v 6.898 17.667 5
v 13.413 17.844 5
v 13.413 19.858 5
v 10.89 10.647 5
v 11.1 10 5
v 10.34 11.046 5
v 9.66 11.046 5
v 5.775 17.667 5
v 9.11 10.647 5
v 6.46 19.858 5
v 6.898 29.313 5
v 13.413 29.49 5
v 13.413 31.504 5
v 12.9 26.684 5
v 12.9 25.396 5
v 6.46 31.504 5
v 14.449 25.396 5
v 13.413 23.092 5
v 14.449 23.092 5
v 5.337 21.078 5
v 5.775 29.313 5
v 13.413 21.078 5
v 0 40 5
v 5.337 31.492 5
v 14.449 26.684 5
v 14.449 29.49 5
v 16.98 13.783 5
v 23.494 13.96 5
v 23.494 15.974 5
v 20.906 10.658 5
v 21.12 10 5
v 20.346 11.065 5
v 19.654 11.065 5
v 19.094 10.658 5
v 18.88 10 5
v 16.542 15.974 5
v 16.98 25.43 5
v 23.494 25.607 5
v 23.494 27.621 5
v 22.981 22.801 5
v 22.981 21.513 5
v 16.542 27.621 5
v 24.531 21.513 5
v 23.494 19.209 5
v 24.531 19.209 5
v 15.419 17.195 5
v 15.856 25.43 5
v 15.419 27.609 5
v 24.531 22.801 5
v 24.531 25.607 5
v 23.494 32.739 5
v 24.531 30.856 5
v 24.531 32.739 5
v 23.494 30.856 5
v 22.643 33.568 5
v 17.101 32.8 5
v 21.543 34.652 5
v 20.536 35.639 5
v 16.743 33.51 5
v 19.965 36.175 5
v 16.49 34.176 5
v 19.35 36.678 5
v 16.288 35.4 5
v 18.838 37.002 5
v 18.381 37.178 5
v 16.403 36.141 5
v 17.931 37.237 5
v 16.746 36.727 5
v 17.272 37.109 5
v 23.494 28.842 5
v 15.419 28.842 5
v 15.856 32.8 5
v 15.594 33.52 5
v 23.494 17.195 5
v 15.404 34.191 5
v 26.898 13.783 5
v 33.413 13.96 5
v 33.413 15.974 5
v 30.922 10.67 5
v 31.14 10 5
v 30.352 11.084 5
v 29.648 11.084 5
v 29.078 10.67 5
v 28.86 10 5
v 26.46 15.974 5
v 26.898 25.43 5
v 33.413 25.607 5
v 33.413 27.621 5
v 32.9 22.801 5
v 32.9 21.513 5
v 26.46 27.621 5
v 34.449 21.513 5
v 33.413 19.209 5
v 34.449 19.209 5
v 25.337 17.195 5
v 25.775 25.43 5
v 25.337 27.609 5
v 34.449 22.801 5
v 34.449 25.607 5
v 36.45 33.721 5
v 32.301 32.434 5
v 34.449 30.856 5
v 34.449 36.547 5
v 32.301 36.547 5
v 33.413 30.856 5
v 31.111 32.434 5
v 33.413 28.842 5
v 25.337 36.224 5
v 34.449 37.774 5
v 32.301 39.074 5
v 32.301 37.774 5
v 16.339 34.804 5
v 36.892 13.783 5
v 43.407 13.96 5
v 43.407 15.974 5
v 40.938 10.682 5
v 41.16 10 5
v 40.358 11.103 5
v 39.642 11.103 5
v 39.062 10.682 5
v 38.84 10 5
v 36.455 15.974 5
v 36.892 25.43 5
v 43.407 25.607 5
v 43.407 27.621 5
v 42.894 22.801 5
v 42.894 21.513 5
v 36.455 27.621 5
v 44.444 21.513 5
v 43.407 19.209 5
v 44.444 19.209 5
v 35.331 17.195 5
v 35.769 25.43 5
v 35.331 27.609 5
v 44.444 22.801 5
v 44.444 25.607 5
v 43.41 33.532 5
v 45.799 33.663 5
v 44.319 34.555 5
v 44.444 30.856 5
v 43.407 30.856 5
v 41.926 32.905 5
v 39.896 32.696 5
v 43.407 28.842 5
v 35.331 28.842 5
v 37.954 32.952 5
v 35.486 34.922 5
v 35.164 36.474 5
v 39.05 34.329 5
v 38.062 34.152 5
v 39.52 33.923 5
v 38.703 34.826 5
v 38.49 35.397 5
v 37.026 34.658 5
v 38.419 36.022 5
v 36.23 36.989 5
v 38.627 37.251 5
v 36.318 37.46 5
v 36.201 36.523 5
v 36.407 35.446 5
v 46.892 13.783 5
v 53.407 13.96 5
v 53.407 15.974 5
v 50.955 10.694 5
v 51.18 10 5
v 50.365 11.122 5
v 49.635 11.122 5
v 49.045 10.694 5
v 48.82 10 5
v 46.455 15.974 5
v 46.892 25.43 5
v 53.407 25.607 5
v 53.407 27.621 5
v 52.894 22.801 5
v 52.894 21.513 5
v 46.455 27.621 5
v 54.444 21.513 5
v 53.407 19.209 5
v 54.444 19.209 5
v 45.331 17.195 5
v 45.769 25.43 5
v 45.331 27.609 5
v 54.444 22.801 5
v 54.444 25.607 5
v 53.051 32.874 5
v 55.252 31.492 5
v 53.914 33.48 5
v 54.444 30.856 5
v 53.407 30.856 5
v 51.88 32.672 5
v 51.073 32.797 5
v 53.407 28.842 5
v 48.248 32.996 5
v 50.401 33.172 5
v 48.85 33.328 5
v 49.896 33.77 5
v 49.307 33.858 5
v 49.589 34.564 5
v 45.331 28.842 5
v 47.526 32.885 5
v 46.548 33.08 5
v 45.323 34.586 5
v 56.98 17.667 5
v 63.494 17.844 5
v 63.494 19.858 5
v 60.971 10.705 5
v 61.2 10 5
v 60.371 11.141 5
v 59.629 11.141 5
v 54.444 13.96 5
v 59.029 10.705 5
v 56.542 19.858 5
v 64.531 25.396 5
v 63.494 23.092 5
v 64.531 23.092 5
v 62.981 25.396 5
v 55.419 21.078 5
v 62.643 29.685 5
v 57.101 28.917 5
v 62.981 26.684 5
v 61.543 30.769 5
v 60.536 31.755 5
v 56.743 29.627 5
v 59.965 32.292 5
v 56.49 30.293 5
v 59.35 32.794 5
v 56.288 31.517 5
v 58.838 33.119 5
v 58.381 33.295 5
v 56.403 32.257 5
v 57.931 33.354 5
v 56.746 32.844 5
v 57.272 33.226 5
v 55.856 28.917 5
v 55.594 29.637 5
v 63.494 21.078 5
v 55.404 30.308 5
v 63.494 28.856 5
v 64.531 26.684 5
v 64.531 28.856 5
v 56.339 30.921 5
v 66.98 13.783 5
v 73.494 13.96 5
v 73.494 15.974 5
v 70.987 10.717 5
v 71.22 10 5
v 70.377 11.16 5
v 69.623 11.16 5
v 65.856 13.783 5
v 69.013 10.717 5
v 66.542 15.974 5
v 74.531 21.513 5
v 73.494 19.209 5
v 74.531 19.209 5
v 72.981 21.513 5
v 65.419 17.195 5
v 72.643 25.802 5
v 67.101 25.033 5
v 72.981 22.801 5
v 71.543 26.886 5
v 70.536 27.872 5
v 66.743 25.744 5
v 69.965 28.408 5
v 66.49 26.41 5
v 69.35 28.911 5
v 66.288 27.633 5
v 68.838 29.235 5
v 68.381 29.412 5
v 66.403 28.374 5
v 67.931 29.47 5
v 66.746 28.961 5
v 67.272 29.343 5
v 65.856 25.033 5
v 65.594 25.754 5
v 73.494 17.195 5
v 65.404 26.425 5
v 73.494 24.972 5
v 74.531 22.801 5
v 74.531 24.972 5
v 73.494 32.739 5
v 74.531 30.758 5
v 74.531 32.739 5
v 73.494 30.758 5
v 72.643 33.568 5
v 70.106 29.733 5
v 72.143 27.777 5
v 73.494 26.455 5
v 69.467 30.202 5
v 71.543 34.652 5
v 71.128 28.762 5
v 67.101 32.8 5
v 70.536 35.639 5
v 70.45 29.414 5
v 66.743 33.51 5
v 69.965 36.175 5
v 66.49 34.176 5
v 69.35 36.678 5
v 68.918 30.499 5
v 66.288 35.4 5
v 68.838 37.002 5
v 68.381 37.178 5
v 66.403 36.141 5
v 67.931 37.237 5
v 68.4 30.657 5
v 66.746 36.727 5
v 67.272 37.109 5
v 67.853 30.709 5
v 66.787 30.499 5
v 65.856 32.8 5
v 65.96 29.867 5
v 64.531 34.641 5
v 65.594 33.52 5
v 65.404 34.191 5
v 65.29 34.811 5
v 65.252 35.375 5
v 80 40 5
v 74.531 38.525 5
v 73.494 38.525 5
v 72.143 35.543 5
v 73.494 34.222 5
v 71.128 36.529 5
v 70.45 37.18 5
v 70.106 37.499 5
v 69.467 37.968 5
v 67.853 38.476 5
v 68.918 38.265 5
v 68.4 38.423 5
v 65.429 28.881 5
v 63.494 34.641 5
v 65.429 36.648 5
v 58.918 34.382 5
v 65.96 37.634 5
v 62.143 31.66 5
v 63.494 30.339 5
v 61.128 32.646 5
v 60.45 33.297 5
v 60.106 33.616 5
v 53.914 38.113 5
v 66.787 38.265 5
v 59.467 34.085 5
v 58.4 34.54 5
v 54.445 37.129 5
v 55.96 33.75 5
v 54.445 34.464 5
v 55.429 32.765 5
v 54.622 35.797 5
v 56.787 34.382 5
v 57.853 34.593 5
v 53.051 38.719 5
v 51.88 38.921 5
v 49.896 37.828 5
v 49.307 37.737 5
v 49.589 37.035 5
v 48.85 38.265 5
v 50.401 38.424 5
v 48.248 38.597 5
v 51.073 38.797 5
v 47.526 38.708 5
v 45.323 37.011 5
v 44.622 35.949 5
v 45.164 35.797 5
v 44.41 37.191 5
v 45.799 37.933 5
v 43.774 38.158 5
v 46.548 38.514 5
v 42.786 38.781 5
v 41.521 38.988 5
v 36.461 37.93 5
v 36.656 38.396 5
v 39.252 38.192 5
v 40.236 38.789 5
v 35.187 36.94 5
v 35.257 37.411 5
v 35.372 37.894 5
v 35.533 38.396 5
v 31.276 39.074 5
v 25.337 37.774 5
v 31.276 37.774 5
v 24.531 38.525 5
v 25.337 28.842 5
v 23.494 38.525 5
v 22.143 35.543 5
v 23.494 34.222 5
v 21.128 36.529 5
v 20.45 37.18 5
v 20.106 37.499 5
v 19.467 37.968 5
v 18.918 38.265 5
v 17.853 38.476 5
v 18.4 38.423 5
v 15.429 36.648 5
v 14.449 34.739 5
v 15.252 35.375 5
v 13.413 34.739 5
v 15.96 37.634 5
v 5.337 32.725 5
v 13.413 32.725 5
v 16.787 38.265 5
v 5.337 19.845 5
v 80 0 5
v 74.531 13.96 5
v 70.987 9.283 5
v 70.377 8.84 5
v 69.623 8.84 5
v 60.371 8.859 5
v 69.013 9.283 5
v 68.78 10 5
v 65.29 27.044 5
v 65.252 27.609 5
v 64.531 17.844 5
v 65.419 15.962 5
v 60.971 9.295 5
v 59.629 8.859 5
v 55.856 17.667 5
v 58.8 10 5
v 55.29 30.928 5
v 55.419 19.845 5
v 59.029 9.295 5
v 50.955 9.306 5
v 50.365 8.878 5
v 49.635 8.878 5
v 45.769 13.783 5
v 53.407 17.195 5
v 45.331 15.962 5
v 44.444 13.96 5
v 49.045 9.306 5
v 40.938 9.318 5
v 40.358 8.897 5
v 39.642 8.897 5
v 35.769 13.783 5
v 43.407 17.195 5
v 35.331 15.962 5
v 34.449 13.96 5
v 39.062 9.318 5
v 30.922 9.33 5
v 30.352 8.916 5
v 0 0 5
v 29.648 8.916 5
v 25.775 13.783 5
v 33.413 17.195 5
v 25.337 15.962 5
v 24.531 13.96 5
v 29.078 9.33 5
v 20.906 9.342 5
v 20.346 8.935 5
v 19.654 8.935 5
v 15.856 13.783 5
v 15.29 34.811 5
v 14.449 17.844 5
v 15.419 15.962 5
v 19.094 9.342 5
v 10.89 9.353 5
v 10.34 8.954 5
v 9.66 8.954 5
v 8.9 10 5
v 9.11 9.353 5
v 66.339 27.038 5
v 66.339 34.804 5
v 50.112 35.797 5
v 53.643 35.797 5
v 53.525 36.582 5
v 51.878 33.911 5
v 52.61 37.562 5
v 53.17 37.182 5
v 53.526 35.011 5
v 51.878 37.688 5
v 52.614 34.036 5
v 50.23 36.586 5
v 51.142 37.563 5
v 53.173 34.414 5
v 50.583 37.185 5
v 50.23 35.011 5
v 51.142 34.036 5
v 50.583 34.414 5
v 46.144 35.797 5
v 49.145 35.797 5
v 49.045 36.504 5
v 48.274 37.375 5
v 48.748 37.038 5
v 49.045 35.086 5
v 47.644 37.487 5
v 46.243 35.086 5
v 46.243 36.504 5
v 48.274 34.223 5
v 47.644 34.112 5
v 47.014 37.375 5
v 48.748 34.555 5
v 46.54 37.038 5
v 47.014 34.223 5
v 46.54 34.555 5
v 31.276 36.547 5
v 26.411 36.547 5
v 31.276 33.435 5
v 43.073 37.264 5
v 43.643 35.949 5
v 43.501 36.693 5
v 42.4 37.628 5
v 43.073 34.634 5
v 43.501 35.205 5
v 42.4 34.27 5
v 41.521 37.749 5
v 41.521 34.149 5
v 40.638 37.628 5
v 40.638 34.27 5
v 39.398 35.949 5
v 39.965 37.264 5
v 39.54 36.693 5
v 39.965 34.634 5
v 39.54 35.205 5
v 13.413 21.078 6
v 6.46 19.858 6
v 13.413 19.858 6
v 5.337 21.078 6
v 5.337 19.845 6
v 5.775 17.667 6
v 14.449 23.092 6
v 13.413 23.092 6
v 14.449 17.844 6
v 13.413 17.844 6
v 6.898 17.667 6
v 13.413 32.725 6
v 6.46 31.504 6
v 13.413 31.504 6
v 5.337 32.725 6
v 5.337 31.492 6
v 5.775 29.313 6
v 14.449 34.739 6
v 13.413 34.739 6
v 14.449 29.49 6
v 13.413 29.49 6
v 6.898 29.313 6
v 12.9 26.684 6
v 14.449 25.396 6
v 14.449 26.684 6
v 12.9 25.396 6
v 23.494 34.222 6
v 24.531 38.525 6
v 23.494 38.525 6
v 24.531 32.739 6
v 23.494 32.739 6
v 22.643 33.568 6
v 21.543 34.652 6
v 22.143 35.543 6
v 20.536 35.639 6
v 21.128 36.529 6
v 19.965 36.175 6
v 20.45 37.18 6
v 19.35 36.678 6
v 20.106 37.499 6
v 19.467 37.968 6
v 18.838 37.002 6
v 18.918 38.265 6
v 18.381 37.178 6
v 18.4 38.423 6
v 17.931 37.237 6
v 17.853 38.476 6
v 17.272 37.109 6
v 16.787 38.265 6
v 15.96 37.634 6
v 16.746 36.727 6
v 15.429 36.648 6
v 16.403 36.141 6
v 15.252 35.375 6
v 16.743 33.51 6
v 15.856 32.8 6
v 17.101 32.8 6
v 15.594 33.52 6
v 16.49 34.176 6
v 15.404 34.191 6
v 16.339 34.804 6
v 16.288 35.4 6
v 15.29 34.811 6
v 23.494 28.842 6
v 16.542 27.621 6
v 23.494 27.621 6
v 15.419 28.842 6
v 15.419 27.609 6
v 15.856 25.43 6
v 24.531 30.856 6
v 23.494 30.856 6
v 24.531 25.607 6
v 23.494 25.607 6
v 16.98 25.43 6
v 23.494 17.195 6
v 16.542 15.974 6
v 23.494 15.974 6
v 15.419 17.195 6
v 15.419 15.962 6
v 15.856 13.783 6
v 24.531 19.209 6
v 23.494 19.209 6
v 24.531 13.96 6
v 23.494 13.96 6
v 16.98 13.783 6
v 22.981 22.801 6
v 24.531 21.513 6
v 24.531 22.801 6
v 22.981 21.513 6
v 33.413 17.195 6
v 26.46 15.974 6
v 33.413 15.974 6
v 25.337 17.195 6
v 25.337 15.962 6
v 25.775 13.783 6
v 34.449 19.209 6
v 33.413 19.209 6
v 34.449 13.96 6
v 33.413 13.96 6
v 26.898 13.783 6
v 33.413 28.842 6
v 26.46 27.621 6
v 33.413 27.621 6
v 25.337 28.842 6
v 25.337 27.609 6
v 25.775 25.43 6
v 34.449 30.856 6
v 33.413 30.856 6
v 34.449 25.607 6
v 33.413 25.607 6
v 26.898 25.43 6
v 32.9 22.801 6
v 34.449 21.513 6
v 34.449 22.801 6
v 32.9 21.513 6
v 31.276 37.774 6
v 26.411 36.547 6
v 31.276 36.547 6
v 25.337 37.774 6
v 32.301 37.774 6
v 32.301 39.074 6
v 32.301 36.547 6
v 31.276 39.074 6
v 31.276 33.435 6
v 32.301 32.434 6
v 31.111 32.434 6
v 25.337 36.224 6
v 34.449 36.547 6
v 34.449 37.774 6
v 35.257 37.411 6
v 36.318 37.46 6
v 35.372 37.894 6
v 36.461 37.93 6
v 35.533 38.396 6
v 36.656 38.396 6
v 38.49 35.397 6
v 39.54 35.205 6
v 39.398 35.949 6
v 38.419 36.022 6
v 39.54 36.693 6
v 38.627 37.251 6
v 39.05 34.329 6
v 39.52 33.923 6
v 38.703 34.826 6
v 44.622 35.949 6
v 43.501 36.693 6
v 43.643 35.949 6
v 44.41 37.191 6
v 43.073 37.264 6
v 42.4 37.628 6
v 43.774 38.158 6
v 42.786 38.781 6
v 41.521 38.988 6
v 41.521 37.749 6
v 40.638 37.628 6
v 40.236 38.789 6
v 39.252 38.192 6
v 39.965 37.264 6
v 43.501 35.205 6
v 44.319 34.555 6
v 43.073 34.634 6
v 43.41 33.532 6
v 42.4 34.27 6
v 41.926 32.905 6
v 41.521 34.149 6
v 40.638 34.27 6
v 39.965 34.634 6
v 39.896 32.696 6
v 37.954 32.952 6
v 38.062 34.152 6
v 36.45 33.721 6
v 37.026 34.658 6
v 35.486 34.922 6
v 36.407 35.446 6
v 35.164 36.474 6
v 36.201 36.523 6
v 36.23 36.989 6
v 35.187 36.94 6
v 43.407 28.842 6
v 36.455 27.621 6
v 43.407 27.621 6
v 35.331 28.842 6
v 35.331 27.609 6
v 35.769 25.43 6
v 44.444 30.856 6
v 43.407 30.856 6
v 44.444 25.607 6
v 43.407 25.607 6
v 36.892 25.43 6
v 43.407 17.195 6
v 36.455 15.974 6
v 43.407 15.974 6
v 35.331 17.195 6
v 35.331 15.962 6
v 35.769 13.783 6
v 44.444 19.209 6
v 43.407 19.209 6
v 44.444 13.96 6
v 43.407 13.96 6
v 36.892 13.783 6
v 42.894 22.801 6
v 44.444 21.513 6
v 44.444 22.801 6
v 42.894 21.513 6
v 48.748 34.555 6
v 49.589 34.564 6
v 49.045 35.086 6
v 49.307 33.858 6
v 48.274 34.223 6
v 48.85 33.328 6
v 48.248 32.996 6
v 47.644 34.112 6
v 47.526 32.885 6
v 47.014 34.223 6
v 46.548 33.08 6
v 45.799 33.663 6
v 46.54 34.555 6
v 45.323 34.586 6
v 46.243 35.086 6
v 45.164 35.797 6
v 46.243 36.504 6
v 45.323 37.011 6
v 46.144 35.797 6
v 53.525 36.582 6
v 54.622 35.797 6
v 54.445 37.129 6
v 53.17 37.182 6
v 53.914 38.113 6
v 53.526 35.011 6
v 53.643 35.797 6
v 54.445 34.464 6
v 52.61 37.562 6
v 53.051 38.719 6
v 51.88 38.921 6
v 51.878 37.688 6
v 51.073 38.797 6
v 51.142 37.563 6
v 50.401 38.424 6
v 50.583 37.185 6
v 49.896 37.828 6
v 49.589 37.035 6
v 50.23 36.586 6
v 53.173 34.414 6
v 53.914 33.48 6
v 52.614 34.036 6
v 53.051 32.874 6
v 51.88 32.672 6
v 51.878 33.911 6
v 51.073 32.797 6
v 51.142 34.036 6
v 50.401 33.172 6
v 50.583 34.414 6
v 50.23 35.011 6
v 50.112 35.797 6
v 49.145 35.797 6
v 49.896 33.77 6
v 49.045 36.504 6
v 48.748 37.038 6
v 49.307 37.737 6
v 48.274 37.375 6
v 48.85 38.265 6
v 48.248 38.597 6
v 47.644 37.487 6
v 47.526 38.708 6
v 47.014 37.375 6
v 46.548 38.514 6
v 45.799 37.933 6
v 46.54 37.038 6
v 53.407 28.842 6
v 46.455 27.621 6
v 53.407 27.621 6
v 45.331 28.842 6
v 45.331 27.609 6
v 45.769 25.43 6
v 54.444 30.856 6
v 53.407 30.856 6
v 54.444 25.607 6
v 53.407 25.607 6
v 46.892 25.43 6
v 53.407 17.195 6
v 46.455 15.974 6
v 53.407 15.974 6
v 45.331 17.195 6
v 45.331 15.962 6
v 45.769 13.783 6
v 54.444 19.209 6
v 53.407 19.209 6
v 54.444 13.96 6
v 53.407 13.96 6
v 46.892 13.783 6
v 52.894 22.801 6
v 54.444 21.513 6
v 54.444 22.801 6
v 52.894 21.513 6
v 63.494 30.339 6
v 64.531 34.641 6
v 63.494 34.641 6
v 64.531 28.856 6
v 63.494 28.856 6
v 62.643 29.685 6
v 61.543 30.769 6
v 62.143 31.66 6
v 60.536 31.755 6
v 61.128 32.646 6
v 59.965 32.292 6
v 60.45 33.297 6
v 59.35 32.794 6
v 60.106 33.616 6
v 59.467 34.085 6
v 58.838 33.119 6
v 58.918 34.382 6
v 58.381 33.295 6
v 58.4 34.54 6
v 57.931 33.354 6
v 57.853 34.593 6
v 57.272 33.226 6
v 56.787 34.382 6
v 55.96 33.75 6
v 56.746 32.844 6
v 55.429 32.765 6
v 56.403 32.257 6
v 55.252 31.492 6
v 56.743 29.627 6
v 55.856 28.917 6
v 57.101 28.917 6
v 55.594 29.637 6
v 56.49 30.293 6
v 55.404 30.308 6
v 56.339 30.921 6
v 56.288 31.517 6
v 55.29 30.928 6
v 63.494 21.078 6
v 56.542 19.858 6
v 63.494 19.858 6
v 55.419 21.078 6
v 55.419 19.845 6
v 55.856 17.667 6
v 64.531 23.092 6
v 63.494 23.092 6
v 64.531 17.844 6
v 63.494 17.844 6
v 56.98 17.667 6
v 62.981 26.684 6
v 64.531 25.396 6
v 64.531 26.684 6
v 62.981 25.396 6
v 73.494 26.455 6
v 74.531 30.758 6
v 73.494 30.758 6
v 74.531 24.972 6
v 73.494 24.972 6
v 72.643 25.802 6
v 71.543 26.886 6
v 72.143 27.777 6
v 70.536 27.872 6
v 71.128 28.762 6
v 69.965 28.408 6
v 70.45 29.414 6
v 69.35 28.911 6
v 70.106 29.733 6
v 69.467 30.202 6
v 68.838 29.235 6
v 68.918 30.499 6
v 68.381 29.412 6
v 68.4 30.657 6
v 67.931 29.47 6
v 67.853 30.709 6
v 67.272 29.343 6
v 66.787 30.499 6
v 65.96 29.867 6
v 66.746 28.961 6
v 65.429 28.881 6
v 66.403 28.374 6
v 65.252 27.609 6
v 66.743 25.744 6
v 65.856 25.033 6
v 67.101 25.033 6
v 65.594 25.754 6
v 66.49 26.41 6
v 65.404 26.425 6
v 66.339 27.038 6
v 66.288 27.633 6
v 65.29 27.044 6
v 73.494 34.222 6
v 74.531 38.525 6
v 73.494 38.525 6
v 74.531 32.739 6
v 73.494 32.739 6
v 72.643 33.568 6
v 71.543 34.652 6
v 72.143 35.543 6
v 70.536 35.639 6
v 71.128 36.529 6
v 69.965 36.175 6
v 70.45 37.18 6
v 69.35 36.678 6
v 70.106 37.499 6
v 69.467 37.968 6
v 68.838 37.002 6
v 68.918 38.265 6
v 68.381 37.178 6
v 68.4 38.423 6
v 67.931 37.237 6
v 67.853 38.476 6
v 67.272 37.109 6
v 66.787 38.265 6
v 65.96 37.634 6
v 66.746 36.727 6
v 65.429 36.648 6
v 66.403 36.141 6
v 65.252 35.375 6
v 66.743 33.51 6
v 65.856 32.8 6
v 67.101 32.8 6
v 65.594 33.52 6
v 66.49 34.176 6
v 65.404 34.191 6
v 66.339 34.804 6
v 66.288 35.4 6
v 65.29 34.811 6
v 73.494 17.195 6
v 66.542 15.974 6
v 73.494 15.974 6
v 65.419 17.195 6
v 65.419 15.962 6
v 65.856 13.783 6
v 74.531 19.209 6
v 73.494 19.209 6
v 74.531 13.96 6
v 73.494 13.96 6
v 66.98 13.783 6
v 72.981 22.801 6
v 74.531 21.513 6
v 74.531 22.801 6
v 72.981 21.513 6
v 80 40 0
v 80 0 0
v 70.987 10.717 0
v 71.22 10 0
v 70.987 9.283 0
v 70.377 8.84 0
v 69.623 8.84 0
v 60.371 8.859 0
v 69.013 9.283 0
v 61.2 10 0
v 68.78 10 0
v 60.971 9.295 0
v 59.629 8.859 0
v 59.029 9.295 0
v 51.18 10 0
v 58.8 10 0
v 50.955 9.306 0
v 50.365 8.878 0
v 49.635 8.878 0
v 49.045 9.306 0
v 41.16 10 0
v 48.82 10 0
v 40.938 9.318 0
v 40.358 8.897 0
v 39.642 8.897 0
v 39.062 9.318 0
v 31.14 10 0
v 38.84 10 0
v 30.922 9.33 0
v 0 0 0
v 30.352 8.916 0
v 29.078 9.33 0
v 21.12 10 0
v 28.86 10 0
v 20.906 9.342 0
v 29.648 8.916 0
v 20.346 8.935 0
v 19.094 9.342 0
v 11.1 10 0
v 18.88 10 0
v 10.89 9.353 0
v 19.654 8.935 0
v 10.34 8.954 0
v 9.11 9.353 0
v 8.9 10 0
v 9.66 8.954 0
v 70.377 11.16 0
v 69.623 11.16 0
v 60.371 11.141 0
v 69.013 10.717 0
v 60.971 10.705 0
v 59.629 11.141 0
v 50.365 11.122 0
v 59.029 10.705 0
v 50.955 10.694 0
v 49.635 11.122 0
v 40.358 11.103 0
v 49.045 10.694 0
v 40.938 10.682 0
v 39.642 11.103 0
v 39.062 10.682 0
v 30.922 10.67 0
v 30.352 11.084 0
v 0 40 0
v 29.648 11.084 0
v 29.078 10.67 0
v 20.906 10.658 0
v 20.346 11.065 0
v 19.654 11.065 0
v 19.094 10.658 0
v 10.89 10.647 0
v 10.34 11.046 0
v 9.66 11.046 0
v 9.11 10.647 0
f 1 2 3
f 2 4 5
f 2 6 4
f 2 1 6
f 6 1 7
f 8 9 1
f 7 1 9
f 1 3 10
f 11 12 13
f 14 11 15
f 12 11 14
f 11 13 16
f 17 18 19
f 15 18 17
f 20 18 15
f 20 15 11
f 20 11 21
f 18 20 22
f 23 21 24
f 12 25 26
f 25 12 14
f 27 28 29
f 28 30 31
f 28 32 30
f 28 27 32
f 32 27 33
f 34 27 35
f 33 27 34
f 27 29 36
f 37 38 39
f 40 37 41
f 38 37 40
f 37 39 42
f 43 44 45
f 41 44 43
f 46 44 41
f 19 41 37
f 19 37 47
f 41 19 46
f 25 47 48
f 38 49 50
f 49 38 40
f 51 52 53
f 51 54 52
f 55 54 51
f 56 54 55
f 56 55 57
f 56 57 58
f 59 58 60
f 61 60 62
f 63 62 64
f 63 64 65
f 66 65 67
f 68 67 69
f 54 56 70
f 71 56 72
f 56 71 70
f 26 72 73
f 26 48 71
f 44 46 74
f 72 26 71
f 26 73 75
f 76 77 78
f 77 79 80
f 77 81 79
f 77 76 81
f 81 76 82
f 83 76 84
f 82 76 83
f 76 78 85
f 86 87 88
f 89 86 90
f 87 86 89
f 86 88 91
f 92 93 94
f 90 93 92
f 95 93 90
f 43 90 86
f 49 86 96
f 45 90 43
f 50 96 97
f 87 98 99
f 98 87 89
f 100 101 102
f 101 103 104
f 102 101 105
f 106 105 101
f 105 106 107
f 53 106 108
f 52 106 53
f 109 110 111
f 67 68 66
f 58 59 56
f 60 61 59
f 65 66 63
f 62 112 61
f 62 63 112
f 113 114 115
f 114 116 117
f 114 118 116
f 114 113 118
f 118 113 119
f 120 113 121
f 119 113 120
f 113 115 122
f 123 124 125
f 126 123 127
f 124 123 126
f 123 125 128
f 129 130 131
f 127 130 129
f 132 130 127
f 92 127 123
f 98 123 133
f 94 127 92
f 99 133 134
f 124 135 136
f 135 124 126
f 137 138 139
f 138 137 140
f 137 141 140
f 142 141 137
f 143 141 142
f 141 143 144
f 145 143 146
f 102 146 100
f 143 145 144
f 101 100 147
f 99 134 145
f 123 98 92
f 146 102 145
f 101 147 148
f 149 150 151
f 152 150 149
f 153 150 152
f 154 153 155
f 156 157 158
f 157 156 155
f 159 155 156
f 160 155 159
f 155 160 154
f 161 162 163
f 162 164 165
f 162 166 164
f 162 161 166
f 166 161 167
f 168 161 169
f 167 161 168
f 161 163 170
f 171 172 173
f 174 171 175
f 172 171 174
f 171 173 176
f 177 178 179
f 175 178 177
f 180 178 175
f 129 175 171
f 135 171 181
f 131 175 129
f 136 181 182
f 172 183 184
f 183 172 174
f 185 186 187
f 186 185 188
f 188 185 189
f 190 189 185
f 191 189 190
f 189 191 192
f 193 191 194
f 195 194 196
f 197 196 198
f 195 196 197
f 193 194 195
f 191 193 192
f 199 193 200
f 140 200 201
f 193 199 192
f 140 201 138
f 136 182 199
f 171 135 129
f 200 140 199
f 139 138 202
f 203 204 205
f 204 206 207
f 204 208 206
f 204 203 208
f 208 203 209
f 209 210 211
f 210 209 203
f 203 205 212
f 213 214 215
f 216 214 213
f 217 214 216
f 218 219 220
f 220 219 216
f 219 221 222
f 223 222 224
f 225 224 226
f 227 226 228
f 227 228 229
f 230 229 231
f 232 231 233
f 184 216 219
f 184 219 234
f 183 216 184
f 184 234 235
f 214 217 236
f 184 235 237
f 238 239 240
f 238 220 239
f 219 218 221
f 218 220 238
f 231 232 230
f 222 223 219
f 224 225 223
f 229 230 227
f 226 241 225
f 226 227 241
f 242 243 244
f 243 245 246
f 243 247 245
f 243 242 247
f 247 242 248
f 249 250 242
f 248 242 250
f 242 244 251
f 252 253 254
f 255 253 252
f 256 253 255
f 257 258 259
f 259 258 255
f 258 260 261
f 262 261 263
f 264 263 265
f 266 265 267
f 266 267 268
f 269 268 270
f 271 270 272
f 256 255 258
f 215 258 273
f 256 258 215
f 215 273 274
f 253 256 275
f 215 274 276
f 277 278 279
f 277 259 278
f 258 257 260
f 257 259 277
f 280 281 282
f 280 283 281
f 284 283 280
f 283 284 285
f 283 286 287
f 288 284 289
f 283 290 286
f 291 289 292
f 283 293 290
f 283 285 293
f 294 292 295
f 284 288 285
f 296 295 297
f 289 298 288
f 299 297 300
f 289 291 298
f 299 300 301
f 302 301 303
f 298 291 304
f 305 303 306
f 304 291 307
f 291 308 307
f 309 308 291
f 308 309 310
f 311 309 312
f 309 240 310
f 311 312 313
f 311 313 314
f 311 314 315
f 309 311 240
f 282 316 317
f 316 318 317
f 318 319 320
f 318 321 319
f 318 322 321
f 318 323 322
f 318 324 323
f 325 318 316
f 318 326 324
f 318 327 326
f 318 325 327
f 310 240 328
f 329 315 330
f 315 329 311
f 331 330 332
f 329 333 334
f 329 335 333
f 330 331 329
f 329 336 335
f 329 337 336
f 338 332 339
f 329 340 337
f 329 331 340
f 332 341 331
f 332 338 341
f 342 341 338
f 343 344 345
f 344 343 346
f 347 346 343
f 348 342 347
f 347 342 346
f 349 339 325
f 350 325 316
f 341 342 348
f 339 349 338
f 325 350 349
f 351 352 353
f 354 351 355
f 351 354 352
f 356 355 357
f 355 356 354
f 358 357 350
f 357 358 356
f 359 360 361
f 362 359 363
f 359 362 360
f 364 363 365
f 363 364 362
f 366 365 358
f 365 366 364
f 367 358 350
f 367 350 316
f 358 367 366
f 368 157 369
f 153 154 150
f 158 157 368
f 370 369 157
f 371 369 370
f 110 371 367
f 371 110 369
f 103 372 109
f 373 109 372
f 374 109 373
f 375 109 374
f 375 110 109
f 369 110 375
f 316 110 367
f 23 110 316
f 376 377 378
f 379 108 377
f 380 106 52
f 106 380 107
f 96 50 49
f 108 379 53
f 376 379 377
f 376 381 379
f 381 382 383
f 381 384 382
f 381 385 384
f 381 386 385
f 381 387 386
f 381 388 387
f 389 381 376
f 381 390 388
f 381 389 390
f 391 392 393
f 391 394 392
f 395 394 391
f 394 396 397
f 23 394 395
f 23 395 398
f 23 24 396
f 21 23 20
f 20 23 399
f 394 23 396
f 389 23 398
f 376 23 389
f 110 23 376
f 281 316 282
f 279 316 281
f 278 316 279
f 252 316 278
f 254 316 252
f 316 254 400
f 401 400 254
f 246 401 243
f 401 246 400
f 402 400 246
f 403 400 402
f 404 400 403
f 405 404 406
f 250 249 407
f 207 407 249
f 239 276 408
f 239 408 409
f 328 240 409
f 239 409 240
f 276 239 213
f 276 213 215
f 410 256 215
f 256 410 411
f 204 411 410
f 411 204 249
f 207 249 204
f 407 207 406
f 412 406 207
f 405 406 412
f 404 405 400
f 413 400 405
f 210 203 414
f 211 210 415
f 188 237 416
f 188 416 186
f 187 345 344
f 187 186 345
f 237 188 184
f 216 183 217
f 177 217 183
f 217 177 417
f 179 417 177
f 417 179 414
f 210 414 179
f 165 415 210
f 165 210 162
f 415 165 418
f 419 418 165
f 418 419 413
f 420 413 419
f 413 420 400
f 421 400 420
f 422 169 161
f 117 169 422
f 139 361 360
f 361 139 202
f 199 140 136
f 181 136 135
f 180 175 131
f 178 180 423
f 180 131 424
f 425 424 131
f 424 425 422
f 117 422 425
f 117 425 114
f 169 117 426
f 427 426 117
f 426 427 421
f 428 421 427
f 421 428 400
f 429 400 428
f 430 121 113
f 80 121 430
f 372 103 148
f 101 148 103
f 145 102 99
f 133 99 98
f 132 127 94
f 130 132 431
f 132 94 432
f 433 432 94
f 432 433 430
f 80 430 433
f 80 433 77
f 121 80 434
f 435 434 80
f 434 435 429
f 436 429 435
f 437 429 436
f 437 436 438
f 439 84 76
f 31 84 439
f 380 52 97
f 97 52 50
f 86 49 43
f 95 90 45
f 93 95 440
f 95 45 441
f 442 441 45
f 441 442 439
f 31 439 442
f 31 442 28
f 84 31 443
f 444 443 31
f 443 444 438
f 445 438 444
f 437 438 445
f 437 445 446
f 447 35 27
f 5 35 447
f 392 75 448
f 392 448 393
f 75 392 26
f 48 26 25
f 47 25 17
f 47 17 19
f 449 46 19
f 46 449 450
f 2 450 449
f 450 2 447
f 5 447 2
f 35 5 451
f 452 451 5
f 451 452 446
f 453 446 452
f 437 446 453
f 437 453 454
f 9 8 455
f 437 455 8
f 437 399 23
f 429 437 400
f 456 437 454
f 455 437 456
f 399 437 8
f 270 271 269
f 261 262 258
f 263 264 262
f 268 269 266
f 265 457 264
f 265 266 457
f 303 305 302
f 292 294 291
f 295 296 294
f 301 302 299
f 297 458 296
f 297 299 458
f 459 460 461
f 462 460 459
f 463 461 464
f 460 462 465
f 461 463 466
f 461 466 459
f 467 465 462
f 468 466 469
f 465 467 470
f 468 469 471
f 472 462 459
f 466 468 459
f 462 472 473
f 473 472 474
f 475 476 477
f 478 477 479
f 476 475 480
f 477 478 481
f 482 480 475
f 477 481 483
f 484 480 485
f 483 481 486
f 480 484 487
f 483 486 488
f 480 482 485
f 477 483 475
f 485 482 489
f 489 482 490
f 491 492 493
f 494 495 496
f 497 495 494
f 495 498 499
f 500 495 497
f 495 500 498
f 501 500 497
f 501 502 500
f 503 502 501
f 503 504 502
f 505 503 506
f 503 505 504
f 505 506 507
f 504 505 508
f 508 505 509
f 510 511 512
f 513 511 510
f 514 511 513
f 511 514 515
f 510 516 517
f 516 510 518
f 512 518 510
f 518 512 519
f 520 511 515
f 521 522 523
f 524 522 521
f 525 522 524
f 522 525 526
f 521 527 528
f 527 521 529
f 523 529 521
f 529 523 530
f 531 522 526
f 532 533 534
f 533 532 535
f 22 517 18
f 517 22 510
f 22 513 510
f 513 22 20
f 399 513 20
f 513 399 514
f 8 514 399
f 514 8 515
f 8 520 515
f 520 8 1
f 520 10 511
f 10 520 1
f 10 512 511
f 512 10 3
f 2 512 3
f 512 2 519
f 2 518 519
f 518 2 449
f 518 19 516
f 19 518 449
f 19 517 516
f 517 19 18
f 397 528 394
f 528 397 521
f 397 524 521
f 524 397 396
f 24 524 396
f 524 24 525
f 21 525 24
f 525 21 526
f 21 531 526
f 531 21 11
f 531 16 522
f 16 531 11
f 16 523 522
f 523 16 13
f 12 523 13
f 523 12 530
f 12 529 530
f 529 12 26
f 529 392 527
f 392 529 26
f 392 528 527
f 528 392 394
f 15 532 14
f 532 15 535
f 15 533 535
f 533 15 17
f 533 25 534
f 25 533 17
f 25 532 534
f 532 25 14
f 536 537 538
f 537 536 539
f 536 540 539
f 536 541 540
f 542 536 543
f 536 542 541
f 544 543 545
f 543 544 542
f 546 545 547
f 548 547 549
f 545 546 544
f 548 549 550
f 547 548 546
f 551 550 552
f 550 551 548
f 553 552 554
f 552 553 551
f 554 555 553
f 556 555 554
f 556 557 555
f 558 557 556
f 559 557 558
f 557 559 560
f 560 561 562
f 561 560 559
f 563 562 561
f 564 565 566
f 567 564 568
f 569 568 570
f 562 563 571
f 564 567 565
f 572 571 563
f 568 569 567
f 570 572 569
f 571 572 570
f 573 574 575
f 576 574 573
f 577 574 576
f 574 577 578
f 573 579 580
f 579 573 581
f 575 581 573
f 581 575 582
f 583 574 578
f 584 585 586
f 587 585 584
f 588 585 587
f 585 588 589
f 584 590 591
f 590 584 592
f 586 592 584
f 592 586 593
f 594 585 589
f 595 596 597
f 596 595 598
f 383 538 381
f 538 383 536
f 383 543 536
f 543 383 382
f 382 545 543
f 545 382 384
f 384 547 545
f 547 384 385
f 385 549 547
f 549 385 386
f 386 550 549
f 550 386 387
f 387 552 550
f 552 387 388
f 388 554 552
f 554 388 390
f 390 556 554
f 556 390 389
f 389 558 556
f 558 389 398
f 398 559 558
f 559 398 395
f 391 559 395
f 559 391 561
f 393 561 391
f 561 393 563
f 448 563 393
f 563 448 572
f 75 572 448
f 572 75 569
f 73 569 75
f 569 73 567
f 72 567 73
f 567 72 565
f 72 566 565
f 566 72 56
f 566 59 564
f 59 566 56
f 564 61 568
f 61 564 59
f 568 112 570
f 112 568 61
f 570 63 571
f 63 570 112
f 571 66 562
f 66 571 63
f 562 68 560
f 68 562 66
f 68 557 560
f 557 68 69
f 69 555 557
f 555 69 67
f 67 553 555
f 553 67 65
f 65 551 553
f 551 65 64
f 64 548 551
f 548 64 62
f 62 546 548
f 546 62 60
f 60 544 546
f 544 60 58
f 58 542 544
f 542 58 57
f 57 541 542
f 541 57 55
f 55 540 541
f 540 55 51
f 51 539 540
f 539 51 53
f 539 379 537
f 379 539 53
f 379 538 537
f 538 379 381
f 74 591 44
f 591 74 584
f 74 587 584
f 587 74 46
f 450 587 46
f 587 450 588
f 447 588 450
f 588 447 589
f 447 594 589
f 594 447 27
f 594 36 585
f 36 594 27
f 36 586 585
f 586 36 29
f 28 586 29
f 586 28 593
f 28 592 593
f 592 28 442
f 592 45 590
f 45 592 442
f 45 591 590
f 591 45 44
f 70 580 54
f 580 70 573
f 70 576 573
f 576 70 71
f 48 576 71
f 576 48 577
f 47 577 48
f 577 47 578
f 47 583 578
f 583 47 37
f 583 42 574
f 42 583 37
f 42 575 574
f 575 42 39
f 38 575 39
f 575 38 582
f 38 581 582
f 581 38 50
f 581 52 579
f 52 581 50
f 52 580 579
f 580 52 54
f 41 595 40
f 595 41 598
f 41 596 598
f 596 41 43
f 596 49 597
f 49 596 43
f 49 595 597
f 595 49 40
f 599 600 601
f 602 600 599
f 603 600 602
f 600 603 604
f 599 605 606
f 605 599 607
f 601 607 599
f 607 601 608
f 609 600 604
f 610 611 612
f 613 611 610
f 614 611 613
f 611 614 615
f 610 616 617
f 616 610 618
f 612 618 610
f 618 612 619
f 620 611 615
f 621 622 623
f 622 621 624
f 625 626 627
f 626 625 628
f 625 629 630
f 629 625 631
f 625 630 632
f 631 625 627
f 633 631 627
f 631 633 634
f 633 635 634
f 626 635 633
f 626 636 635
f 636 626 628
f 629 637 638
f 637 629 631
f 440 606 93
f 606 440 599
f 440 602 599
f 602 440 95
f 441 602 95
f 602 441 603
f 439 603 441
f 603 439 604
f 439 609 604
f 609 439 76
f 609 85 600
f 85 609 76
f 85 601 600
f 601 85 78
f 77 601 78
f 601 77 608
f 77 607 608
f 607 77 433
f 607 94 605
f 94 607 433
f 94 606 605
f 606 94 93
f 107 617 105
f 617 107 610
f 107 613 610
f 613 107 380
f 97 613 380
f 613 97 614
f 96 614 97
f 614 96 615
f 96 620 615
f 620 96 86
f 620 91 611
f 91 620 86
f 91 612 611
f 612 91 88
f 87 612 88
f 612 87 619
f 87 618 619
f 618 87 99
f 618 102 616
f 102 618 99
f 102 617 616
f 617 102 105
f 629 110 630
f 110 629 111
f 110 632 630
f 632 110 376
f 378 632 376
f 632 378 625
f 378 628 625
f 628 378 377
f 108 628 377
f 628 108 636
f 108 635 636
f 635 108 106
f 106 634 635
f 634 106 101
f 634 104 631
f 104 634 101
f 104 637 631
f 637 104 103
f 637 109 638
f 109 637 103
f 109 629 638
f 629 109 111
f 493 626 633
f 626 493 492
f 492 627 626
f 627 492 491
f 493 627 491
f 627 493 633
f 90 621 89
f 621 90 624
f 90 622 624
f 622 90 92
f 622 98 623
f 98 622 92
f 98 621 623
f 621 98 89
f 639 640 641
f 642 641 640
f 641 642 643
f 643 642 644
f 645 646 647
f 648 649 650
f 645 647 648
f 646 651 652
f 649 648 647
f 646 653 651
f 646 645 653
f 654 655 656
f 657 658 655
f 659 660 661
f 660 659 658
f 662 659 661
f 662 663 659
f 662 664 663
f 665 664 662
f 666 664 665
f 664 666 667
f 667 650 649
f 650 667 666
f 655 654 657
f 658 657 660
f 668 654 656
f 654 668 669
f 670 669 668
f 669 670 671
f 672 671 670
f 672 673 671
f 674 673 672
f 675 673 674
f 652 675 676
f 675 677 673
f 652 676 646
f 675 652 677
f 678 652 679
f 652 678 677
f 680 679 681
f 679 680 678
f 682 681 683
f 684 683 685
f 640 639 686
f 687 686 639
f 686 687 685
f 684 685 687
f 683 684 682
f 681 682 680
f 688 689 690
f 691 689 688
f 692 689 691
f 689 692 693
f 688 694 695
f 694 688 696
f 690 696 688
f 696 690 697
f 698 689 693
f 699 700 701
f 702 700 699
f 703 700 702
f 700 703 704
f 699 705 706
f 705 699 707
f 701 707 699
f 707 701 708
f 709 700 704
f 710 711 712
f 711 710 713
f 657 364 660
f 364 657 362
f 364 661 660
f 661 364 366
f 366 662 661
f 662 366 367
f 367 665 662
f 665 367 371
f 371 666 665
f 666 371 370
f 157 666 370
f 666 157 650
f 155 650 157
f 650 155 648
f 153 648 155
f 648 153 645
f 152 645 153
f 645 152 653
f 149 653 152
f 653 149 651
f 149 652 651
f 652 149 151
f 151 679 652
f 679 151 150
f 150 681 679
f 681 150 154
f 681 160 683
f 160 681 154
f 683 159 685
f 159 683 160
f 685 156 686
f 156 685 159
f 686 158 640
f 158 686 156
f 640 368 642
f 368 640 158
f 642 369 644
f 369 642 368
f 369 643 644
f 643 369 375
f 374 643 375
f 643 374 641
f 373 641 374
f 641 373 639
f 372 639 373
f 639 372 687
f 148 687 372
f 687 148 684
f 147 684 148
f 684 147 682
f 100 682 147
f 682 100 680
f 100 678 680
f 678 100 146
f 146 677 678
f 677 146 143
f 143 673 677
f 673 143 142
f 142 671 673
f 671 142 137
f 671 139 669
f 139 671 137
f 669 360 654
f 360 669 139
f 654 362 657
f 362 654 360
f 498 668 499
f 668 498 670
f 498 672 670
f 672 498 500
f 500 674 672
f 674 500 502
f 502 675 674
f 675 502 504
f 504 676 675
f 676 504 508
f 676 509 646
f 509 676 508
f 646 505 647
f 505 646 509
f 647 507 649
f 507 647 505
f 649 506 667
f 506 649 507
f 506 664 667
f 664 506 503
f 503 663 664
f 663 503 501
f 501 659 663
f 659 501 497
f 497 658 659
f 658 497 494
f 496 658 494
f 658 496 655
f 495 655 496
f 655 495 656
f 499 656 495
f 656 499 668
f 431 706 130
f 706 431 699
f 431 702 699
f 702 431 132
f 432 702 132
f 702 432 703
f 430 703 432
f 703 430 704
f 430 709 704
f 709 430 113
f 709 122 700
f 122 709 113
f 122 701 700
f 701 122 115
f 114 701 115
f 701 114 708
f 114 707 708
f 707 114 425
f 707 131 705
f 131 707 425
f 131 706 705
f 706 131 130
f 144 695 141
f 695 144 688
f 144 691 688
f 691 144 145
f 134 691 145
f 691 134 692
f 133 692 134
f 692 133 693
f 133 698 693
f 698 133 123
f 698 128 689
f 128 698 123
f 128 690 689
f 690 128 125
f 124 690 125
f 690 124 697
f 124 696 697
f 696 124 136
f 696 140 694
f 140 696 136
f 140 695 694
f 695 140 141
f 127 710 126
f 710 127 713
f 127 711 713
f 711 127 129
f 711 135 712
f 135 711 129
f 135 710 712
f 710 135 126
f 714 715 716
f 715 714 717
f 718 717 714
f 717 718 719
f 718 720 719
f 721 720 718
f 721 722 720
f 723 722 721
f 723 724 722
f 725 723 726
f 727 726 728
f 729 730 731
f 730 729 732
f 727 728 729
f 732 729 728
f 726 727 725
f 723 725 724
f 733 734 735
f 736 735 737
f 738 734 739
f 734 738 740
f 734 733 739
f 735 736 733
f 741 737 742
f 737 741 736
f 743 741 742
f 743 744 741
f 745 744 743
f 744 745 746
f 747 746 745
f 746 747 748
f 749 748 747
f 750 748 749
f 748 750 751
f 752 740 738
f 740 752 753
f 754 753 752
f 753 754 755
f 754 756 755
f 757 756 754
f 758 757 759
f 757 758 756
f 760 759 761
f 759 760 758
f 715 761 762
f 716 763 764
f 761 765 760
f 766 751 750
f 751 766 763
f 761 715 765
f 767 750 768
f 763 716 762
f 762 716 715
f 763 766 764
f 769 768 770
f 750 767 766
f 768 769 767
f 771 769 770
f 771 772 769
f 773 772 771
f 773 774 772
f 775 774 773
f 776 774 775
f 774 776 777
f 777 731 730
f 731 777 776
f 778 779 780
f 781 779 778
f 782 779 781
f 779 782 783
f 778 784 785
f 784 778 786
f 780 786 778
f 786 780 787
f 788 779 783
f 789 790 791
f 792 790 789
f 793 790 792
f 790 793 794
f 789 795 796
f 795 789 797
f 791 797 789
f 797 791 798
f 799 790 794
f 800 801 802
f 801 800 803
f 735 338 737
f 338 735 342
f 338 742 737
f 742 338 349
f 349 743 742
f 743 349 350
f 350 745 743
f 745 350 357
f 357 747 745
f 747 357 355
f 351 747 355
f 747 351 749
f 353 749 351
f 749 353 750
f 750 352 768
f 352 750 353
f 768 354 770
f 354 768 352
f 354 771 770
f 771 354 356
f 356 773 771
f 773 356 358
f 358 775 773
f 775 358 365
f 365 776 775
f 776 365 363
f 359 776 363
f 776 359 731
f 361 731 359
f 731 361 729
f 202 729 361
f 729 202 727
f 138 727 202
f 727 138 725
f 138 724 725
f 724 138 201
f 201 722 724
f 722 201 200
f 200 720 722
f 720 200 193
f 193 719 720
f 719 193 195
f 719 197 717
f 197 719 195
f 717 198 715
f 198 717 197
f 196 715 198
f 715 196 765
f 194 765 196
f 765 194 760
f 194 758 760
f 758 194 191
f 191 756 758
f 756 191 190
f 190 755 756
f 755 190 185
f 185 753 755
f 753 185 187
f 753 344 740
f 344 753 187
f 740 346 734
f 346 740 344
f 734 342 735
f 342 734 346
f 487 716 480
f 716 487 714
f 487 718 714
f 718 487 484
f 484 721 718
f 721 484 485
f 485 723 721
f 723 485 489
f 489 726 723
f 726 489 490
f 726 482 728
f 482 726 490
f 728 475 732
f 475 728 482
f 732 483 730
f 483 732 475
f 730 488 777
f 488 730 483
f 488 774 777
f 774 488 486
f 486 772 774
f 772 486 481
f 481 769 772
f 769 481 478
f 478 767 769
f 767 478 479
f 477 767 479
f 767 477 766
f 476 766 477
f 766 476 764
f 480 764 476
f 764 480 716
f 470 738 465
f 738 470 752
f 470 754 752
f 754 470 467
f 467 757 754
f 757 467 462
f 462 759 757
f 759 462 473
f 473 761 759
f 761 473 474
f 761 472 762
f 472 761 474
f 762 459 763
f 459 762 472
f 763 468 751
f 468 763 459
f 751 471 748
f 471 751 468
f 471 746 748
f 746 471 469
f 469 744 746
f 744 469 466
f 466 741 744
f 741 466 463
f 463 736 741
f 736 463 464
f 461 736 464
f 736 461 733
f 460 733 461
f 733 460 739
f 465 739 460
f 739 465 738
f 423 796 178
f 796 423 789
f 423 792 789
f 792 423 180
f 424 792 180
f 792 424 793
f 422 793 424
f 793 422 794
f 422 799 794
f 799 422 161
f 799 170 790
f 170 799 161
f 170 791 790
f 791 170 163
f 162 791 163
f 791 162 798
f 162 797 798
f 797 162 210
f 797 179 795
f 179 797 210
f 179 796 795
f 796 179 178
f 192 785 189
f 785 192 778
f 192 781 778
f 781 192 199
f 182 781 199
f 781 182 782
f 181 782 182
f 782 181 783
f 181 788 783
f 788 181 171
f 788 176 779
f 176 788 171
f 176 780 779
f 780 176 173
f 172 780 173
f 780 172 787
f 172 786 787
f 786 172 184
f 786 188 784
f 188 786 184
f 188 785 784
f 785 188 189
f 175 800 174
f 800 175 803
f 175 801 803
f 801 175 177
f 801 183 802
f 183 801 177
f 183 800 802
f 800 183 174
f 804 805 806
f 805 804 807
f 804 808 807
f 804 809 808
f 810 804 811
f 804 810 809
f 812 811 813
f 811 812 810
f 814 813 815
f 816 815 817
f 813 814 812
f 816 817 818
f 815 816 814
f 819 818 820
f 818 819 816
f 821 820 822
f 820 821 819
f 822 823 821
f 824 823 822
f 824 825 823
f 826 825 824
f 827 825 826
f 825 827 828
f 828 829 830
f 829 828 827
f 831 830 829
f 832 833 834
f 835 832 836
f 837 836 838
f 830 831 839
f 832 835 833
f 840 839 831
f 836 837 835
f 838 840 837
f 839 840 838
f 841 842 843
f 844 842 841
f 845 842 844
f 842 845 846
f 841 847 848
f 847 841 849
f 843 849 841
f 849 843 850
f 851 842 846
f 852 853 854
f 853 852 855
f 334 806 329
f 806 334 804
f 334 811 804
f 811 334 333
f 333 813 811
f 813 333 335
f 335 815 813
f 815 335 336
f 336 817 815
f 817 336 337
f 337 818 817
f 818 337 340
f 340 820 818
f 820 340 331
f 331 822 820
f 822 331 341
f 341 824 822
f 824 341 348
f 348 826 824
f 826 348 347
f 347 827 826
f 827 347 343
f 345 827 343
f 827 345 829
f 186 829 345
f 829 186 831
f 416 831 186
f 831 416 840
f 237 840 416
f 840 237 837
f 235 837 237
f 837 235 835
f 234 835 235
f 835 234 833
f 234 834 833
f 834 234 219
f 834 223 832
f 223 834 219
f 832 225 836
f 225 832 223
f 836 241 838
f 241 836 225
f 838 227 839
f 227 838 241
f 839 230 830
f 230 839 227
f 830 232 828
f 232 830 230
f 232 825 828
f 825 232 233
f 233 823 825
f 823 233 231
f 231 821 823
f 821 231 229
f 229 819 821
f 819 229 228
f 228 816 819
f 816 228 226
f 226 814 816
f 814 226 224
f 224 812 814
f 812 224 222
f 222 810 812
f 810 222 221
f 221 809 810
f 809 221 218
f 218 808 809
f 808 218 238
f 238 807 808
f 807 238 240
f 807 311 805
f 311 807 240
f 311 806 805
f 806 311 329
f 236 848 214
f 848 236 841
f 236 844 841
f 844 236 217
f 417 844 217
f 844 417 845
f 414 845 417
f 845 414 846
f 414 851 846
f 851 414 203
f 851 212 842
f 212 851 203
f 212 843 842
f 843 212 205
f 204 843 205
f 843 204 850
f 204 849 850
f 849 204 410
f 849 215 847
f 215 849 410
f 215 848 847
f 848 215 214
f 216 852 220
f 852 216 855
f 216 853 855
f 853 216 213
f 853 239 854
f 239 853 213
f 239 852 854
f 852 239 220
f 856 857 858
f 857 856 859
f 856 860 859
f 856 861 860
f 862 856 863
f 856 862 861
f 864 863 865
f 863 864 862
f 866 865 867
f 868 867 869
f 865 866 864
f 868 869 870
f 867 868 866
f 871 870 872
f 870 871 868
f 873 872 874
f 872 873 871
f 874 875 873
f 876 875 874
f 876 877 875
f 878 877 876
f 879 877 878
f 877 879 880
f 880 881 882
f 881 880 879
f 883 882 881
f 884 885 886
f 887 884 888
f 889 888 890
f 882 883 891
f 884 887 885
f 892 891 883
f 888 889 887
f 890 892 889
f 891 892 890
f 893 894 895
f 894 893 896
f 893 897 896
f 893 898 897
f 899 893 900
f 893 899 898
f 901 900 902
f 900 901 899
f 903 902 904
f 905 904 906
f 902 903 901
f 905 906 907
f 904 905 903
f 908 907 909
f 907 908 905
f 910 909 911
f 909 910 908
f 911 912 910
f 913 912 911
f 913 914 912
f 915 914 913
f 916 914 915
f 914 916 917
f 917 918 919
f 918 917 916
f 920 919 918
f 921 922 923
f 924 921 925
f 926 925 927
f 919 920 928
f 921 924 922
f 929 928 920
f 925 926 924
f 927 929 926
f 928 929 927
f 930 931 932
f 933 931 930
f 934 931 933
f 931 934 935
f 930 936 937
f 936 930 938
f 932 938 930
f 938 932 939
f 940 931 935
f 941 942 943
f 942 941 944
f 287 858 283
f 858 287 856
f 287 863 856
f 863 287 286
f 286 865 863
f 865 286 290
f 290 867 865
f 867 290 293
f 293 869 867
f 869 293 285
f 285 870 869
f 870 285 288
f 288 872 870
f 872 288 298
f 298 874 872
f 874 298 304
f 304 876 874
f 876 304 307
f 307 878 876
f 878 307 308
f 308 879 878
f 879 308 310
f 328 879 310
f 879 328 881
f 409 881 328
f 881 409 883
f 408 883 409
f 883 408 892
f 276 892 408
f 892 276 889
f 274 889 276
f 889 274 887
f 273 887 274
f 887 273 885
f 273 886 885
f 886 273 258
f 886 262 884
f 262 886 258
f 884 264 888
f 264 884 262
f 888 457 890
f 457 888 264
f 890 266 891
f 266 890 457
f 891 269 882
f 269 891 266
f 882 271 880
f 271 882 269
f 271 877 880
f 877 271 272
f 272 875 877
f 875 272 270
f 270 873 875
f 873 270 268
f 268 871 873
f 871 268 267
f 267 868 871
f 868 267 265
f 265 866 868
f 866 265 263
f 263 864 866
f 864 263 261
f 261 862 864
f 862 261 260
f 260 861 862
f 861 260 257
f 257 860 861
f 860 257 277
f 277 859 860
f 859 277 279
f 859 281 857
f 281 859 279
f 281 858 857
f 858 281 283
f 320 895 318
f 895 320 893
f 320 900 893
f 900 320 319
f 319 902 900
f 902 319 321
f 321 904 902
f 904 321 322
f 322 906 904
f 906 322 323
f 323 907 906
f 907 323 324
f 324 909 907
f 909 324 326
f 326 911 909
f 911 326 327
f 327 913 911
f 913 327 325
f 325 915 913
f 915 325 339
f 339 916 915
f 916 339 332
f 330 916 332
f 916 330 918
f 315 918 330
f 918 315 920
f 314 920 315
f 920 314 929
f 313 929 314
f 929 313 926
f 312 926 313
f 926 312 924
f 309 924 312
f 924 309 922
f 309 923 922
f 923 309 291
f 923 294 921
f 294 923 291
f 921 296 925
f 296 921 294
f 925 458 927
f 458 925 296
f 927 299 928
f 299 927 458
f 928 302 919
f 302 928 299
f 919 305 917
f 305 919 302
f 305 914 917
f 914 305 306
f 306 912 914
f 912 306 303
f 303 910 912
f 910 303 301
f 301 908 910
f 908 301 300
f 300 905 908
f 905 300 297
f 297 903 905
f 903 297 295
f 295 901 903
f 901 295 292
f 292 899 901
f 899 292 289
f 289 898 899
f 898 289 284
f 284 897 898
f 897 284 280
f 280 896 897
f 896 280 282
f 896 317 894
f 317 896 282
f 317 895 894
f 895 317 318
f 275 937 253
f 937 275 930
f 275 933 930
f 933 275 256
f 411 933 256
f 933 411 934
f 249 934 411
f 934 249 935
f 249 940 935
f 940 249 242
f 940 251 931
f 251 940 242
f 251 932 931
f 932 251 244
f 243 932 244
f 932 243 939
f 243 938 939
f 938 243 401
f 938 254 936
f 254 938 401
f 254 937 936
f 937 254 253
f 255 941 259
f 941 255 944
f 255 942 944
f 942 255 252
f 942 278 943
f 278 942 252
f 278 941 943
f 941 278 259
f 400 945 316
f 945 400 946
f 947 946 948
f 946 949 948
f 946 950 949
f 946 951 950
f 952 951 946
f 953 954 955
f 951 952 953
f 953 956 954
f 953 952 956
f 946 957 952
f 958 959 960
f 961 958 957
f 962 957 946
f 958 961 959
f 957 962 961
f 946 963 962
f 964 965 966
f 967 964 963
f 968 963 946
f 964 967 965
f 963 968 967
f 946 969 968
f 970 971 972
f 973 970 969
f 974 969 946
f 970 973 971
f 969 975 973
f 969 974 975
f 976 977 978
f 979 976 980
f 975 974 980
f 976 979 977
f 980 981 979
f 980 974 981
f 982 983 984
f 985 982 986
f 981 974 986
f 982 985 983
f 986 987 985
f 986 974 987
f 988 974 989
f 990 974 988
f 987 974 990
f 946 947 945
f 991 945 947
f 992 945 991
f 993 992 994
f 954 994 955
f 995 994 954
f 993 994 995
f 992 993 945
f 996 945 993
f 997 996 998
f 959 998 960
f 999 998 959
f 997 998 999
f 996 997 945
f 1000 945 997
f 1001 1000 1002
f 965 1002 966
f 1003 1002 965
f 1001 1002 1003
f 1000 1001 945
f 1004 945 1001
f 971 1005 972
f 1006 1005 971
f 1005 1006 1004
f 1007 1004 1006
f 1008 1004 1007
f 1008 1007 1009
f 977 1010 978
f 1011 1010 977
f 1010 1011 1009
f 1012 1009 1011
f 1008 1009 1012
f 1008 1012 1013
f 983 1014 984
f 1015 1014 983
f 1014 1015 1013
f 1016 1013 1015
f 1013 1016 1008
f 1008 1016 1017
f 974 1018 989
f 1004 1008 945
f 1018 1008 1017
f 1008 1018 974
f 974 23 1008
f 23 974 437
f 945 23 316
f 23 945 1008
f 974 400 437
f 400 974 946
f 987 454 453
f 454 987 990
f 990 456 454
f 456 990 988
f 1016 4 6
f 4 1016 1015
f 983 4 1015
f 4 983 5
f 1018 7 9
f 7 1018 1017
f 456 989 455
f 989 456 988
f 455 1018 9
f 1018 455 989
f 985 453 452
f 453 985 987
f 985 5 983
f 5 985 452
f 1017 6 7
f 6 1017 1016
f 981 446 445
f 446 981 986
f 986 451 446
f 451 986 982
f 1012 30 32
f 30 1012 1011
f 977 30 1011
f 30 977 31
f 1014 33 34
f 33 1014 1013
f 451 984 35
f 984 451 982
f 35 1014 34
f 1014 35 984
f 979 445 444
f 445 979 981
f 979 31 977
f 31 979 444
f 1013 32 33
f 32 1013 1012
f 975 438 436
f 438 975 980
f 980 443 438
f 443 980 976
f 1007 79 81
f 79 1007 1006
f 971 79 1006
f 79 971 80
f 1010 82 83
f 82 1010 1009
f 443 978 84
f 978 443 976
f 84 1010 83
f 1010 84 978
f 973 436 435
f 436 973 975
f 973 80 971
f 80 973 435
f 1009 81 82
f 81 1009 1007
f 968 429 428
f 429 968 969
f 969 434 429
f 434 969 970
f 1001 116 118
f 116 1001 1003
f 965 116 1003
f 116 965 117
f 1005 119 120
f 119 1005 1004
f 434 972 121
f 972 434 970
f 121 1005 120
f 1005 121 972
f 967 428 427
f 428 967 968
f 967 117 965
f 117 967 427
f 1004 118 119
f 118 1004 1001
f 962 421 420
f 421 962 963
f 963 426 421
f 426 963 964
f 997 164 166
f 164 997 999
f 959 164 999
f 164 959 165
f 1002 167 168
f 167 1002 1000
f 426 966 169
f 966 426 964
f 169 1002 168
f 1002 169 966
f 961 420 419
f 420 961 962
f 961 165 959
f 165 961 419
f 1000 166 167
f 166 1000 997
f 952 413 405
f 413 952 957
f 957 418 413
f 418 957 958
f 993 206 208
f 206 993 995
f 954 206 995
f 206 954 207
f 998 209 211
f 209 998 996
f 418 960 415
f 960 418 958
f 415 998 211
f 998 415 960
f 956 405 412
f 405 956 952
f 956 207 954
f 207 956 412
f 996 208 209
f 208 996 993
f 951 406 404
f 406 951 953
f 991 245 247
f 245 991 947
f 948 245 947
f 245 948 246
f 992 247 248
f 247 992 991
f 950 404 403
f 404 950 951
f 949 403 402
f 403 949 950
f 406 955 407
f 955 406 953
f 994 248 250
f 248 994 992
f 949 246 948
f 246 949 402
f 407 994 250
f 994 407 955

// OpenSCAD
$fn=10;

rList =
		[
//			1.0, 1.25, 1.5, 1.75, 2.0
			1.1, 1.12, 1.14, 1.16, 1.18, 1.20, 1.22
//			1.0, 1.1, 1.2, 1.3, 1.5, 1.75, 2.0
//			2.0, 2.5, 3.0, 3.5, 4.0, 4.5, 5.0
		];

h = 5;
w = 40;

difference()
{
	union()
	{
		color("green")
			cube([10 * (len(rList) + 1), w, h], false);

		for (i = [0 : (len(rList) - 1)])
		{
			x = (i + 1) * 10;
			r = rList[i];
			echo(str("Printing ", i, " width = ", r));
			createLabel(x, r);
		}
	}
	for (i = [0 : (len(rList) - 1)])
	{
		x = 10 + i * 10;
		r = rList[i];
		createHole(x, r);
	}
}

	module createHole(x, radius)
	{
		translate([x, w * 0.25, -0.1])
			cylinder(h * 1.1, radius, radius);
	}

	module createLabel(x, radius)
	{
		translate([x, w * 0.65, h])
			linear_extrude(height=1, convexity=4)
			{
				rotate([0, 0, 90])
					text(str(radius), size=9, font="OpenSymbol", halign="center", valign="center");
			};
	}
